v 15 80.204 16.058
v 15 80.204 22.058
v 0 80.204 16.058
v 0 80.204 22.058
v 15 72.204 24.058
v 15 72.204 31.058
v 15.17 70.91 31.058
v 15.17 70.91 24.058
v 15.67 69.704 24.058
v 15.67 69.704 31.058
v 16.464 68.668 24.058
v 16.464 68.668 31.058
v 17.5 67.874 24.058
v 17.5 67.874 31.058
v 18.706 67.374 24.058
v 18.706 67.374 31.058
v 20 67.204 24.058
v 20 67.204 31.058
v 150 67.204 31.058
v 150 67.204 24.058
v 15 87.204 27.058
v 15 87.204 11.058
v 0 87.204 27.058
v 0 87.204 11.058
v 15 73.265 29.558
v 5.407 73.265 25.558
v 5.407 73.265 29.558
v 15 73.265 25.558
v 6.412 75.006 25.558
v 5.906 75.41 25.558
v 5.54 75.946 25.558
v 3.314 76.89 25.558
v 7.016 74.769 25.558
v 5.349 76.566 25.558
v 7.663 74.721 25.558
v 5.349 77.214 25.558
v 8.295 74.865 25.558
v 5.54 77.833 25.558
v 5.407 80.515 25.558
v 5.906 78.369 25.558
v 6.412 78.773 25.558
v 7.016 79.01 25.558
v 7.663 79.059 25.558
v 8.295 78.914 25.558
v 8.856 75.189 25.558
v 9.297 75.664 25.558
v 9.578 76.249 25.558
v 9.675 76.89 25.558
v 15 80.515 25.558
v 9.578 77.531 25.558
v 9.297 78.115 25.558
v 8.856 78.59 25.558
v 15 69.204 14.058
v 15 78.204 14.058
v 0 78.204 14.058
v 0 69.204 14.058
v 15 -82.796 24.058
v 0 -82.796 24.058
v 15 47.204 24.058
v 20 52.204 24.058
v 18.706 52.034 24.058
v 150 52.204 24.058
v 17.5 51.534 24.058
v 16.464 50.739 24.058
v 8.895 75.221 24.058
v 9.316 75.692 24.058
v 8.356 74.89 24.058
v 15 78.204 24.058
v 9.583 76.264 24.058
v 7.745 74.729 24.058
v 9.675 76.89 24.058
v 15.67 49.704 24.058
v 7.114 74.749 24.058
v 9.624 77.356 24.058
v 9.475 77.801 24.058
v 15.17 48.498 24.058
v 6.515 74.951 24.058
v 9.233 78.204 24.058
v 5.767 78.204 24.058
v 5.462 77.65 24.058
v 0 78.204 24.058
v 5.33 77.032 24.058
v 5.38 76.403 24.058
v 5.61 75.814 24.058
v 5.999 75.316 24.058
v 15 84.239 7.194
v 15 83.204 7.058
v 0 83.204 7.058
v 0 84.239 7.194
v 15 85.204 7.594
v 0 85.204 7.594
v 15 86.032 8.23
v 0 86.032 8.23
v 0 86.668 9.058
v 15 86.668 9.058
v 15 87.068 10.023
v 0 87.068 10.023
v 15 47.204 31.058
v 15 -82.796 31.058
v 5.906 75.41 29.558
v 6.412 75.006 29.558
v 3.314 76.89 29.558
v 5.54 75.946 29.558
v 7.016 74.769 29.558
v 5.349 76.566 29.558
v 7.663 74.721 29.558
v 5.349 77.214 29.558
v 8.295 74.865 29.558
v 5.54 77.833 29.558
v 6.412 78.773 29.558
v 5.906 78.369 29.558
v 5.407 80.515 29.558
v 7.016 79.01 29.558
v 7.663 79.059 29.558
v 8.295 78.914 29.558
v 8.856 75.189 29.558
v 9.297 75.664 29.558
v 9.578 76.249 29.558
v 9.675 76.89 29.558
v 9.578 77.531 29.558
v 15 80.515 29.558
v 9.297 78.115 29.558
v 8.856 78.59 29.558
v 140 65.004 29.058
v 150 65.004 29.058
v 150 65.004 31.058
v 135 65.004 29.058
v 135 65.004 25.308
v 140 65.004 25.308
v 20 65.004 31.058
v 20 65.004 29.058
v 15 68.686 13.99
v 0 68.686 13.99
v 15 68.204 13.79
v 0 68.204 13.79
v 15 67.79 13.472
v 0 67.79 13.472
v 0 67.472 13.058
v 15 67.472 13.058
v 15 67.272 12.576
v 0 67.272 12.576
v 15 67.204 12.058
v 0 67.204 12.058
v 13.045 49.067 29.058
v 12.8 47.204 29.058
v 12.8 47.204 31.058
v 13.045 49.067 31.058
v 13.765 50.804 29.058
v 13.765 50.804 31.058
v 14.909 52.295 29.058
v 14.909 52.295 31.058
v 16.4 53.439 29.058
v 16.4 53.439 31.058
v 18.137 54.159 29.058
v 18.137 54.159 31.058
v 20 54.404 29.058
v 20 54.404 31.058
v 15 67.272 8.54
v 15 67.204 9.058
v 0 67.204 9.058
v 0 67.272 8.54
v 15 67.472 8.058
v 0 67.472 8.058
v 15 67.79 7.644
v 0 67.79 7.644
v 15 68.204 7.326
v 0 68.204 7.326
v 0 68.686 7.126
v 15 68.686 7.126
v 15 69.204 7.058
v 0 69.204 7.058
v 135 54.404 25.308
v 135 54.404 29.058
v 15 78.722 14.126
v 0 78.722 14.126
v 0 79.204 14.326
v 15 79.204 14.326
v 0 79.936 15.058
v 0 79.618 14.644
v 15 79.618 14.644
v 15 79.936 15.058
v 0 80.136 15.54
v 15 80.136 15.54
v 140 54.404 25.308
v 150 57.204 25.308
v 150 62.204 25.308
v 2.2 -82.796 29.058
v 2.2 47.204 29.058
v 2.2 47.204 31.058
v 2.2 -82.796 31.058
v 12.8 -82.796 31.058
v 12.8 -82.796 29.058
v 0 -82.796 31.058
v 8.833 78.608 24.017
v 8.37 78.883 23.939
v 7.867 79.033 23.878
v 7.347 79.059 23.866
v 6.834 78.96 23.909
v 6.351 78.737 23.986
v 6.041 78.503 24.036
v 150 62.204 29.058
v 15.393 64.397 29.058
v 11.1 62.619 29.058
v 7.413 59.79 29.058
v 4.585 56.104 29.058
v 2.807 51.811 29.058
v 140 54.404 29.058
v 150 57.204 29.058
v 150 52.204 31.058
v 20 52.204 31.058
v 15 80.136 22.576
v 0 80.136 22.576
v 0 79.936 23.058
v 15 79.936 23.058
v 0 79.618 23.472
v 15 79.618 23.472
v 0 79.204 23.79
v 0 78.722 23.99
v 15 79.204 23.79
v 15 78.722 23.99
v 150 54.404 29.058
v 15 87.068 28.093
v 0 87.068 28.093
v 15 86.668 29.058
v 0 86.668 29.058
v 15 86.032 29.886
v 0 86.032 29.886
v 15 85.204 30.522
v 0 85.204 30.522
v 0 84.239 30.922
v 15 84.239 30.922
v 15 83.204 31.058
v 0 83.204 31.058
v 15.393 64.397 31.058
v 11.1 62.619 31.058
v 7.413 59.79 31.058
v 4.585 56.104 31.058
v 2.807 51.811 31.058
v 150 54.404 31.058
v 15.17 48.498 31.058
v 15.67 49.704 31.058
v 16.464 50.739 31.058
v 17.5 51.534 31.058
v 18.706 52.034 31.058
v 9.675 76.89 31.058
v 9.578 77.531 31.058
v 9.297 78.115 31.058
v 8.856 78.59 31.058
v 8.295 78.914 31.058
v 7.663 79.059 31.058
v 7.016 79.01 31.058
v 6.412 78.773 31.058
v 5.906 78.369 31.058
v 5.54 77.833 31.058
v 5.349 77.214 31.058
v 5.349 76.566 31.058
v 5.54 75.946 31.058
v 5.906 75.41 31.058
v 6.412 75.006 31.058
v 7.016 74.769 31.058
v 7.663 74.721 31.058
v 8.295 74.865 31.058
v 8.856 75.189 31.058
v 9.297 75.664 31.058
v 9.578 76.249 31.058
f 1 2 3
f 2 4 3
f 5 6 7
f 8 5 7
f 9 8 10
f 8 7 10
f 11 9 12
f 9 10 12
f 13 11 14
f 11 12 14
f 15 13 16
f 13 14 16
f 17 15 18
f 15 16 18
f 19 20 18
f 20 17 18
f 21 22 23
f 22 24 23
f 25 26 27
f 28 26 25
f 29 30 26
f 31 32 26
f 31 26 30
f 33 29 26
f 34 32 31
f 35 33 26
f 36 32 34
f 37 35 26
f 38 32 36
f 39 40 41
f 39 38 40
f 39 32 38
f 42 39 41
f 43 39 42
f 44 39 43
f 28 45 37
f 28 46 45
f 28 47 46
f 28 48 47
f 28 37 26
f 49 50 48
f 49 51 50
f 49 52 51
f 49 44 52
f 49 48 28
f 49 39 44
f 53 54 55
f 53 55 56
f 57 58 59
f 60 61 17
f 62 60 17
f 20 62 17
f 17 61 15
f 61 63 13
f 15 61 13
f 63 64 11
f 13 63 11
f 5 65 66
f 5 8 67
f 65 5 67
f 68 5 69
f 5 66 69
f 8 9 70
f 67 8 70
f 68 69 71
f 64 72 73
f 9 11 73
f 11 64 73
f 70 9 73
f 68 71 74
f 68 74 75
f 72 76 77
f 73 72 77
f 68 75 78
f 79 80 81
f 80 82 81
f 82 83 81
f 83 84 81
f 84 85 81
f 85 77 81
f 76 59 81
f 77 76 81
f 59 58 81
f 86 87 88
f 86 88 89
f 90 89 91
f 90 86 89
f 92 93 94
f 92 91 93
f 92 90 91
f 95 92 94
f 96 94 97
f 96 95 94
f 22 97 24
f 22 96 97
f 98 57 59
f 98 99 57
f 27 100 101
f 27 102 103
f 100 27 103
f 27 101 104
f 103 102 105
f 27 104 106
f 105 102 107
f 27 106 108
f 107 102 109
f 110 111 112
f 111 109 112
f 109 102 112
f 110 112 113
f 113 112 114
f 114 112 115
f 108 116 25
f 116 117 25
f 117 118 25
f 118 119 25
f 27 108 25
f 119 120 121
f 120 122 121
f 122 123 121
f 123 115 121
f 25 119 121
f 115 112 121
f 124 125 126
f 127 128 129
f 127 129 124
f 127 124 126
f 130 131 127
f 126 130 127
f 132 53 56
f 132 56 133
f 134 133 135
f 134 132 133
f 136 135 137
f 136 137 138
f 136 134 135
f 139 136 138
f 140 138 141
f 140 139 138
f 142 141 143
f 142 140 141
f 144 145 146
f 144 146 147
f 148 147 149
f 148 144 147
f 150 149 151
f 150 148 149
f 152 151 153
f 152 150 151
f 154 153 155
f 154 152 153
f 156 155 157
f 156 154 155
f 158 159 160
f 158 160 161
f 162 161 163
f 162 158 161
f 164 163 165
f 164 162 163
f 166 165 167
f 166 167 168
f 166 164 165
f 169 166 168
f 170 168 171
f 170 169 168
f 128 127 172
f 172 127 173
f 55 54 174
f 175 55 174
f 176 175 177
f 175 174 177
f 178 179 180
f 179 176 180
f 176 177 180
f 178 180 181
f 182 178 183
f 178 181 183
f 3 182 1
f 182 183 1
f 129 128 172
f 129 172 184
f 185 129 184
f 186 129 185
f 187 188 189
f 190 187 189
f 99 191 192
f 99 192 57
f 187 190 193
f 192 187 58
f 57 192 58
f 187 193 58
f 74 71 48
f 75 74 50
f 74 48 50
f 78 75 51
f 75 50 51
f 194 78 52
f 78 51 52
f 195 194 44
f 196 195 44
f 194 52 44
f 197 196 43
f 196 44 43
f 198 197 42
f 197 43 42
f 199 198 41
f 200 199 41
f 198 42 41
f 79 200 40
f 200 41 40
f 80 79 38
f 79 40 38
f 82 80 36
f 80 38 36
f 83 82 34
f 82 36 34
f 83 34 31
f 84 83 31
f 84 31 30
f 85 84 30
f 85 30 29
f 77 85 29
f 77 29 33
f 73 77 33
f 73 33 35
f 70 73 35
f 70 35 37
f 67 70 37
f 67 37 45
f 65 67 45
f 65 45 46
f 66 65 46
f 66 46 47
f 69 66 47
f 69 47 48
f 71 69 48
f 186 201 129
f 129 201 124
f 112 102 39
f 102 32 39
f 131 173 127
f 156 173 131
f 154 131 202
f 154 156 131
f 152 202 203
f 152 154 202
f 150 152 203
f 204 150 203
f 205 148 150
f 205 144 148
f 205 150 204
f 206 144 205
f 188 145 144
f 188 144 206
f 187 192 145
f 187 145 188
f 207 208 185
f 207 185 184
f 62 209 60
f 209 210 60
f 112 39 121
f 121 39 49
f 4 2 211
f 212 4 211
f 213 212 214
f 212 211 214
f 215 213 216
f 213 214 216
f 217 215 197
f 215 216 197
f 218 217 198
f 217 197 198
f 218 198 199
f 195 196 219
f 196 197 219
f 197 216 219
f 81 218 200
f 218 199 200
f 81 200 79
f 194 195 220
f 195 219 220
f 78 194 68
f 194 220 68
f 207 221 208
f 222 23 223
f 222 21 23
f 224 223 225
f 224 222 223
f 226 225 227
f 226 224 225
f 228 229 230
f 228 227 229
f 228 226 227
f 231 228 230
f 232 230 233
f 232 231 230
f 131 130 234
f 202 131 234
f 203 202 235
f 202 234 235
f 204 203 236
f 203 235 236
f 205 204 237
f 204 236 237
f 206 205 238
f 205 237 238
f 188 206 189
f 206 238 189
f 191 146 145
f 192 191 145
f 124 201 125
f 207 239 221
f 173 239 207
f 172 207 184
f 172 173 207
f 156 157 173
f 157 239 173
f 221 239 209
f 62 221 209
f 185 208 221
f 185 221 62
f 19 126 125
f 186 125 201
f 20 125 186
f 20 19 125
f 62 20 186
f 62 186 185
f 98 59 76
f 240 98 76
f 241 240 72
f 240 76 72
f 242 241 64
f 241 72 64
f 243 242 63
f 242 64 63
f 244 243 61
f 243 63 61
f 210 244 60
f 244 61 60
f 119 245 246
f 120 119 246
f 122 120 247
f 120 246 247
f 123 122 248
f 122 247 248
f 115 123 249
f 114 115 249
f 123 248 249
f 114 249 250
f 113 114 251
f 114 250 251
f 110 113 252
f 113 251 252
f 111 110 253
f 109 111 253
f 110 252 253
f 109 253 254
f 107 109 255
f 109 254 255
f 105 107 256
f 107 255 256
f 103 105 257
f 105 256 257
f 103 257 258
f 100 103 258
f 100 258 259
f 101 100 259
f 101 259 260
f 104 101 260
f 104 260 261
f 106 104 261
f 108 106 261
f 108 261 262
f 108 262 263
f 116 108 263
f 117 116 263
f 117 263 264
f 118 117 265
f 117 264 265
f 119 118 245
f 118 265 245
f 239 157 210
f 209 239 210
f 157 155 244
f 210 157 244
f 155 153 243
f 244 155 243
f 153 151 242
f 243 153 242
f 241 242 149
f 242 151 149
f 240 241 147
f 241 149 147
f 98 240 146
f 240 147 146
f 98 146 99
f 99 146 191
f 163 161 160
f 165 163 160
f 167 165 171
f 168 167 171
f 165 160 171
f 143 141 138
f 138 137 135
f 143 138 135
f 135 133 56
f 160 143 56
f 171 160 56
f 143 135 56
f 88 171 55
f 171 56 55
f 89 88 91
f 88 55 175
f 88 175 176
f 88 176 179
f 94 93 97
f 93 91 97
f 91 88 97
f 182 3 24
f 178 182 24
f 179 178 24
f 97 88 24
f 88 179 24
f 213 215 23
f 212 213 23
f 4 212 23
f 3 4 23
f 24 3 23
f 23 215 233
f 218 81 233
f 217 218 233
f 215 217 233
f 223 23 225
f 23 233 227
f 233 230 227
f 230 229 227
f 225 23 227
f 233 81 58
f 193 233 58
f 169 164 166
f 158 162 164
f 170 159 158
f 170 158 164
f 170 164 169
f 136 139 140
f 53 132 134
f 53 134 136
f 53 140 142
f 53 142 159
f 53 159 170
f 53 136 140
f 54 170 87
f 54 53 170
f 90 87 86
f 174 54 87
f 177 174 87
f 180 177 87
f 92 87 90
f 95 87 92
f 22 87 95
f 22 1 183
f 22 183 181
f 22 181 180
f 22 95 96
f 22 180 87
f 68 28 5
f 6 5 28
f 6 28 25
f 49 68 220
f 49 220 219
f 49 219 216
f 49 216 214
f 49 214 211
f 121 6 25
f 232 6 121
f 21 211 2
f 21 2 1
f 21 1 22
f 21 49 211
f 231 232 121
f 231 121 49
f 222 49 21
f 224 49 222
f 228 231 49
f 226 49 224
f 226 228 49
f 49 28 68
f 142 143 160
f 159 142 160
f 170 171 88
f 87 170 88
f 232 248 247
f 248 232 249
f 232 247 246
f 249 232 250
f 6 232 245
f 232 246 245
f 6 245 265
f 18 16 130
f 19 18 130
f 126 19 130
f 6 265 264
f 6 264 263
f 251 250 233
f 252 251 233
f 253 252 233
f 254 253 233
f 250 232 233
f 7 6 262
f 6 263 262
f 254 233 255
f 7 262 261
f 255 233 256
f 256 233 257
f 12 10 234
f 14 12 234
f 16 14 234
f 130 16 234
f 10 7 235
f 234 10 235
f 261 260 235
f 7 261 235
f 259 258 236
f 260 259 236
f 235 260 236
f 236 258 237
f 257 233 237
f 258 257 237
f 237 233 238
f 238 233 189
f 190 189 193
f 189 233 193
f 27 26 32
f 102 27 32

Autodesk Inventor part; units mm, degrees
ref_plane "YZ Plane" through (0, 0, 0) normal (1, 0, 0) x (0, 1, 0)
ref_plane "XZ Plane" through (0, 0, 0) normal (0, 1, 0) x (-1, 0, 0)
ref_plane "XY Plane" through (0, 0, 0) normal (0, 0, 1) x (1, 0, 0)
sketch "Sketch1" plane through (0, 0, 0) normal (1, 0, 0) x (0, 1, 0)
  line L0 (67.2039, 7.058) -> (87.2039, 7.058)
  line L1 (87.2039, 7.058) -> (87.2039, 31.058)
  line L2 (87.2039, 31.058) -> (-82.7961, 31.058)
  line L3 (-82.7961, 31.058) -> (-82.7961, 24.058)
  line L4 (-82.7961, 24.058) -> (80.2039, 24.058)
  line L5 (80.2039, 24.058) -> (80.2039, 14.058)
  line L6 (80.2039, 14.058) -> (67.2039, 14.058)
  line L7 (67.2039, 14.058) -> (67.2039, 7.058)
  dimension "d0" = 10
  dimension "d1" = 13
  dimension "d2" = 7
  dimension "d3" = 7
  dimension "d5" = 7
  dimension "d6" = 170
extrude "Extrusion1" add sketch "Sketch1" along normal blind 15
sketch "Sketch2" plane through (15, 0, 0) normal (1, 0, 0) x (0, 0, -1)
  line L0 (-7.058, 67.2039) -> (-7.058, 87.2039) projected
  line L1 (-7.058, 87.2039) -> (-31.058, 87.2039) projected
  line L2 (-31.058, 87.2039) -> (-31.058, -82.7961) projected
  line L3 (-31.058, -82.7961) -> (-24.058, -82.7961) projected
  line L4 (-24.058, -82.7961) -> (-24.058, 80.2039) projected
  line L5 (-24.058, 80.2039) -> (-14.058, 80.2039) projected
  line L6 (-14.058, 80.2039) -> (-14.058, 67.2039) projected
  line L7 (-14.058, 67.2039) -> (-7.058, 67.2039) projected
  line L8 (-31.058, 52.2039) -> (-24.058, 52.2039)
  line L9 (-24.058, 80.2039) -> (-24.058, -82.7961) projected
  line L10 (-24.058, 67.2039) -> (-31.058, 67.2039)
  point P0 (0, 0)
  dimension "d9" = 15
  dimension "d10" = 20
extrude "Extrusion2" add sketch "Sketch2" along normal blind 135 contours L10 L4 L8 L2
fillet "Fillet1" radius 5 2 edges at (15, 67.2039, 27.558) (15, 52.2039, 27.558)
ref_plane "Work Plane1" through (0, 67.2039, 10.558) normal (0, 0, 1) x (1, 0, 0)
sketch "Sketch6" plane through (150, 0, 0) normal (1, 0, 0) x (0, 0, -1)
  line L0 (-31.058, 52.2039) -> (-24.058, 52.2039) projected
  line L1 (-24.058, 52.2039) -> (-24.058, 67.2039) projected
  line L2 (-24.058, 67.2039) -> (-31.058, 67.2039) projected
  line L3 (-31.058, 67.2039) -> (-31.058, 52.2039) projected
  line L4 (-31.058, 54.4039) -> (-29.058, 54.4039)
  line L5 (-29.058, 54.4039) -> (-29.058, 65.0039)
  line L6 (-29.058, 65.0039) -> (-31.058, 65.0039)
  line L7 (-31.058, 67.2039) -> (-31.058, 52.2039) construction
  line L8 (-31.058, 59.7039) -> (-29.058, 59.7039) construction
  point P0 (0, 0)
  dimension "d23" = 10.6
  dimension "d24" = 2
sketch "Sketch7" plane through (0, -82.7961, 31.058) normal (0, 0, 1) x (1, 0, 0)
  line L0 (0, 0) -> (0, 170) projected
  line L1 (0, 0) -> (15, 0) projected
  line L2 (15, 130) -> (15, 0) projected
  arc A0 (20, 135) -> (15, 130) centre (20, 130) ccw projected
  line L3 (20, 135) -> (150, 135) projected
  line L4 (150, 150) -> (150, 135) projected
  line L5 (20, 150) -> (150, 150) projected
  arc A1 (15, 155) -> (20, 150) centre (20, 155) ccw projected
  line L6 (15, 170) -> (15, 155) projected
  line L7 (0, 170) -> (15, 170) projected
  arc A2 (20, 142.5) -> (7.5, 130) centre (20, 130) ccw
  line L8 (150, 135) -> (150, 150) projected
  line L9 (150, 142.5) -> (20, 142.5)
  line L10 (0, 0) -> (15, 0) projected
  line L11 (7.5, 0) -> (7.5, 130)
  point P0 (0, 82.7961)
  dimension "d25" = 7.5
sweep "Sweep1" cut profiles "Sketch6" path "Sketch7" path curves L9 A2 L11 contours L3 L6 L5 L4
sketch "Sketch8" plane through (0, -82.7961, 31.058) normal (0, 0, 1) x (1, 0, 0)
  line L0 (150, 147.8) -> (150, 137.2) projected
  line L1 (150, 147.8) -> (20, 147.8) projected
  arc A0 (20, 147.8) -> (2.2, 130) centre (20, 130) ccw projected
  line L2 (2.2, 130) -> (2.2, 0) projected
  line L3 (12.8, 0) -> (2.2, 0) projected
  line L4 (12.8, 130) -> (12.8, 0) projected
  arc A1 (20, 137.2) -> (12.8, 130) centre (20, 130) ccw projected
  line L5 (150, 137.2) -> (20, 137.2) projected
  line L6 (2.2, 0) -> (2.2, 130) projected
  arc A2 (20, 147.8) -> (2.2, 130) centre (20, 130) ccw projected
  line L7 (20, 147.8) -> (150, 147.8) projected
  line L8 (150, 150) -> (150, 147.8) projected
  line L9 (20, 150) -> (150, 150) projected
  arc A3 (15, 155) -> (20, 150) centre (20, 155) ccw projected
  line L10 (15, 170) -> (15, 155) projected
  line L11 (0, 170) -> (15, 170) projected
  line L12 (0, 0) -> (0, 170) projected
  line L13 (0, 0) -> (2.2, 0) projected
  line L14 (12.8, 130) -> (12.8, 0) projected
  line L15 (12.8, 0) -> (15, 0) projected
  line L16 (15, 130) -> (15, 0) projected
  arc A4 (20, 135) -> (15, 130) centre (20, 130) ccw projected
  line L17 (20, 135) -> (150, 135) projected
  line L18 (150, 137.2) -> (150, 135) projected
  line L19 (150, 137.2) -> (20, 137.2) projected
  arc A5 (20, 137.2) -> (12.8, 130) centre (20, 130) ccw projected
  line L20 (150, 135) -> (150, 150) projected
  line L21 (150, 142.5) -> (135.884, 142.5) construction
  line L22 (150, 145) -> (140, 147.8)
  line L23 (150, 147.8) -> (20, 147.8) construction
  line L24 (140, 147.8) -> (135, 147.8)
  line L25 (135, 147.8) -> (135, 137.2)
  line L26 (150, 137.2) -> (20, 137.2) projected
  line L27 (135, 137.2) -> (140, 137.2)
  line L28 (150, 140) -> (140, 137.2)
  line L29 (150, 140) -> (150, 145) construction
  line L30 (150, 145) -> (150, 140)
  point P0 (0, 82.7961)
  dimension "d29" = 5
  dimension "d30" = 5
  dimension "d31" = 15
  dimension "d32" = 5
extrude "Extrusion5" cut sketch "Sketch8" against normal blind 5.75 contours L0 L28 L5 L25 L1 L22
fillet "Fillet2" radius 4 2 edges at (7.5, 87.2039, 31.058) (7.5, 87.2039, 7.058)
fillet "Fillet3" radius 2 2 edges at (7.5, 80.2039, 24.058) (7.5, 80.2039, 14.058)
fillet "Fillet4" radius 2 2 edges at (7.5, 67.2039, 7.058) (7.5, 67.2039, 14.058)
sketch "Sketch9" plane through (20, 67.2039, 31.058) normal (0, 0, 1) x (1, 0, 0)
  line L0 (-20, 16) -> (-5, 16) projected
  line L1 (-5, 16) -> (-5, 5) projected
  circle A0 centre (-12.5, 9.6858) radius 2.175
  line L2 (-12.5, 16) -> (-12.5, 9.6858) construction
  line L3 (-5, 9.6858) -> (-12.5, 9.6858) construction
  point P0 (-20, -67.2039)
  dimension "d38" = 4.35
  dimension "d39" = 6.3142
extrude "Extrusion6" cut sketch "Sketch9" against normal blind 10
ref_plane "Work Plane2" through (20, 67.2039, 27.558) normal (0, 0, 1) x (1, 0, 0)
sketch "Sketch10" plane through (20, 67.2039, 27.558) normal (0, 0, 1) x (1, 0, 0)
  line L0 (-14.2331, 11) -> (-20, 11) projected
  line L1 (-20, 11) -> (-20, 13) projected
  line L2 (-20, 13) -> (-5, 13) projected
  line L3 (-5, 13) -> (-5, 11) projected
  line L4 (-5, 11) -> (-10.7669, 11) projected
  arc A0 (-14.2331, 11) -> (-10.7669, 11) centre (-12.5, 9.6858) ccw projected
  line L5 (-5, 11) -> (-10.7669, 11) projected
  line L6 (-5, 5) -> (-5, 11) projected
  arc A1 (-5, 5) -> (0, 0) centre (0, 5) ccw projected
  line L7 (0, 0) -> (130, 0) projected
  line L8 (130, -15) -> (130, 0) projected
  line L9 (130, -15) -> (0, -15) projected
  arc A2 (0, -15) -> (-5, -20) centre (0, -20) ccw projected
  line L10 (-5, -150) -> (-5, -20) projected
  line L11 (-20, -150) -> (-5, -150) projected
  line L12 (-20, 11) -> (-20, -150) projected
  line L13 (-14.2331, 11) -> (-20, 11) projected
  line L14 (-10.4071, 6.0608) -> (-14.5929, 6.0608)
  line L15 (-14.5929, 6.0608) -> (-16.6858, 9.6858)
  line L16 (-16.6858, 9.6858) -> (-14.5929, 13.3108)
  line L17 (-14.5929, 13.3108) -> (-10.4071, 13.3108)
  line L18 (-8.3142, 9.6858) -> (-12.5, 9.6858) construction
  line L19 (-10.4071, 13.3108) -> (-5, 13.3108)
  line L20 (-5, 2) -> (-5, 16) projected
  line L21 (-10.4071, 6.0608) -> (-5, 6.0608)
  line L22 (-5, 6.0608) -> (-5, 13.3108)
  line L23 (-10.4071, 13.3108) -> (-10.372, 13)
  point P0 (-20, -67.2039)
  dimension "d42" = 7.25
extrude "Extrusion7" cut sketch "Sketch10" along normal mid plane 4 contours A0 L4 L6 L21 L14 L15 L16 L0 | L0 L16 L2 L3 L4 A0 | L16 L17 L23 L2 | L23 L19 L20 L2
equation "\"d3\" = d2"
equation "\"d5\" = d2"
equation "\"d30\" = d29"
properties part number "Top Clip"
